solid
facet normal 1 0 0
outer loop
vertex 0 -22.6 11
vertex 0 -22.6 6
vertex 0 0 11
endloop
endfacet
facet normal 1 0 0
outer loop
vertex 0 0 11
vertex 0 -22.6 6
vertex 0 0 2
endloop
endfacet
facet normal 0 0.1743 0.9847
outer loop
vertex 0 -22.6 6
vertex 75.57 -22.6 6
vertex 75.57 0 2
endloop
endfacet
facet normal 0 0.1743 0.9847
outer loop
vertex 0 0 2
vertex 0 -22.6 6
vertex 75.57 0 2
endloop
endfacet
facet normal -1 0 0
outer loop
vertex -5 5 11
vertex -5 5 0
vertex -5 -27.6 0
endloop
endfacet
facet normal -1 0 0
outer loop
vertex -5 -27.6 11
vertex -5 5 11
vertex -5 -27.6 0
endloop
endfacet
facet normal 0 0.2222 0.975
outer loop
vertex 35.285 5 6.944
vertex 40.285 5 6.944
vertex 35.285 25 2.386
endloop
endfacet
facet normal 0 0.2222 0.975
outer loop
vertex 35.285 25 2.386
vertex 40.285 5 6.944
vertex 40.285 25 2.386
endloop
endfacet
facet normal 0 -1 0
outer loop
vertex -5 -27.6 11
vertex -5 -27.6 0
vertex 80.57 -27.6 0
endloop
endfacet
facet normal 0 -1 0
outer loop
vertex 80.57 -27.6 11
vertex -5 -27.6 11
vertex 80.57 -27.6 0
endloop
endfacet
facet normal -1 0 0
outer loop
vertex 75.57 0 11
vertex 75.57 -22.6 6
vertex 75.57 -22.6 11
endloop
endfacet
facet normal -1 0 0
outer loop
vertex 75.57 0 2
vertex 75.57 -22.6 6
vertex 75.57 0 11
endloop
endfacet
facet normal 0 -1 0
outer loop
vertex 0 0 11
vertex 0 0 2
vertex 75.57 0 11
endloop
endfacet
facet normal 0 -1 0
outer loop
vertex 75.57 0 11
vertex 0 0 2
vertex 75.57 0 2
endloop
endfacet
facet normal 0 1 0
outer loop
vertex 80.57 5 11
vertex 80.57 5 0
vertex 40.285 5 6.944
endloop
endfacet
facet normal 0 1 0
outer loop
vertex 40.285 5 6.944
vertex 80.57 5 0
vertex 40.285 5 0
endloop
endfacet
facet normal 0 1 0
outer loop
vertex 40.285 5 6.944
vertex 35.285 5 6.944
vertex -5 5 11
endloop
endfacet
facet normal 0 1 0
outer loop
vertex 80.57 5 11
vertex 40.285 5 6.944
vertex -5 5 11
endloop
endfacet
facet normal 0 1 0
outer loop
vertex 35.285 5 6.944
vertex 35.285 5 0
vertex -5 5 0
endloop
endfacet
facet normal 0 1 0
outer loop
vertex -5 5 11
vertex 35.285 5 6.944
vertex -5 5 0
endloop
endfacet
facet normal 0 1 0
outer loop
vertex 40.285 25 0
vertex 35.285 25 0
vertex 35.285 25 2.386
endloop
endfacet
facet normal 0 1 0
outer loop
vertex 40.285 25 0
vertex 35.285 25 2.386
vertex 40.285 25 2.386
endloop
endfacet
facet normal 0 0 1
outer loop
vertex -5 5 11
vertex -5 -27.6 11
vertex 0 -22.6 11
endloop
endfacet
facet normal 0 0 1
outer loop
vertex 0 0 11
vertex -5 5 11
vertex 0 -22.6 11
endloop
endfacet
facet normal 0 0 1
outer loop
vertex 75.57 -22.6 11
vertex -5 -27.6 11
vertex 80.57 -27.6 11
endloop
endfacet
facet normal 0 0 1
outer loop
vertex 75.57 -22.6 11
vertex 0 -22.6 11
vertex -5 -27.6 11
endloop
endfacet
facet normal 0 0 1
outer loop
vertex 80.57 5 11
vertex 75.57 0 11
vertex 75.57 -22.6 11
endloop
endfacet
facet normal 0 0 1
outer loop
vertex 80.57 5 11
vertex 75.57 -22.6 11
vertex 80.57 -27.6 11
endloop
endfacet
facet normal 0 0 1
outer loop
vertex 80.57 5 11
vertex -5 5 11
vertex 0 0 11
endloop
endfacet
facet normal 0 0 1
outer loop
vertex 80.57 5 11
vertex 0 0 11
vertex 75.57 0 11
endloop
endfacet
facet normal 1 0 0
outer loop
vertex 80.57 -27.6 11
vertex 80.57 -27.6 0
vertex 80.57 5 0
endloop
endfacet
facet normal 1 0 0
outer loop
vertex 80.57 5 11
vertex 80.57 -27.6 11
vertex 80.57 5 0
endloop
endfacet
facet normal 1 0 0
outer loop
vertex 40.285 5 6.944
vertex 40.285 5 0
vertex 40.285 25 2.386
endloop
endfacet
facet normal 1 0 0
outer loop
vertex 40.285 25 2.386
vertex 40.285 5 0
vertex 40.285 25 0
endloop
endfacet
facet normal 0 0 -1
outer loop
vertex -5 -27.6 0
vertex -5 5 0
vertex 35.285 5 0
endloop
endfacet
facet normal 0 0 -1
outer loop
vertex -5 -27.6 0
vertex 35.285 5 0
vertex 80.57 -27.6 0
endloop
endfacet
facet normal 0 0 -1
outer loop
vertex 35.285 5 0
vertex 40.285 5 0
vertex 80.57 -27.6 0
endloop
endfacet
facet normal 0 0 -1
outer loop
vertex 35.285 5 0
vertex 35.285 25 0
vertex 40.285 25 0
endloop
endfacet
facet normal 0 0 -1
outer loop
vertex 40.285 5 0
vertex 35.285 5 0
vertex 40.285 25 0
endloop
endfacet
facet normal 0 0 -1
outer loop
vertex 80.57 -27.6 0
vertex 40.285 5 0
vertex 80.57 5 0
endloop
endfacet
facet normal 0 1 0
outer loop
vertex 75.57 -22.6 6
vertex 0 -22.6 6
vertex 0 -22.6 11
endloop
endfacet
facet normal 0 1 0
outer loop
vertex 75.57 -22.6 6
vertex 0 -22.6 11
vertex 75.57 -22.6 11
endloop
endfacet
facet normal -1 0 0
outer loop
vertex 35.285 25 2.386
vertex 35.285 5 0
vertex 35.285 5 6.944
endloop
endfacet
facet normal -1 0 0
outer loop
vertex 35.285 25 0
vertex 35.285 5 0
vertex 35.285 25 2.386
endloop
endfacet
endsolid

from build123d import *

# Parameters (mm, degrees)
F0_W     = 75.57
F0_H     = 22.6
F1_DEPTH = 2
F0_W_2   = 5
F0_H_2   = 20
F2_DEPTH = 11
F4_DEPTH = 75.57
F6_DEPTH = 25


with BuildPart() as f1:
    # F0 (on Top) → F1 (new body)
    with BuildSketch(Plane.XY):
        with Locations((37.785, -11.3)):
            Rectangle(F0_W, F0_H)
    extrude(amount=F1_DEPTH)

    # F0 (on Top) → F2 (join)
    with BuildSketch(Plane.XY):
        Polygon((35.285, 5), (-5, 5), (-5, -27.6), (80.57, -27.6), (80.57, 5), (40.285, 5), align=None)
        with Locations((37.785, -11.3)):
            Rectangle(F0_W, F0_H, mode=Mode.SUBTRACT)
        with Locations((37.785, 15)):
            Rectangle(F0_W_2, F0_H_2)
    extrude(amount=F2_DEPTH)

    # F3 (on face) → F4 (join, through all)
    with BuildSketch(Plane(origin=(75.57, 0, 0), x_dir=(0, -1, 0), z_dir=(-1, 0, 0))):
        Polygon((22.6, 6), (0, 2), (22.6, 2), align=None)
    extrude(amount=F4_DEPTH)

    # F5 (on face) → F6 (cut)
    with BuildSketch(Plane.YZ.offset(40.285)):
        Polygon((5, 6.94435), (25, 2.385827), (25, 11), (5, 11), align=None)
    extrude(amount=-F6_DEPTH, mode=Mode.SUBTRACT)


solid = f1.part
